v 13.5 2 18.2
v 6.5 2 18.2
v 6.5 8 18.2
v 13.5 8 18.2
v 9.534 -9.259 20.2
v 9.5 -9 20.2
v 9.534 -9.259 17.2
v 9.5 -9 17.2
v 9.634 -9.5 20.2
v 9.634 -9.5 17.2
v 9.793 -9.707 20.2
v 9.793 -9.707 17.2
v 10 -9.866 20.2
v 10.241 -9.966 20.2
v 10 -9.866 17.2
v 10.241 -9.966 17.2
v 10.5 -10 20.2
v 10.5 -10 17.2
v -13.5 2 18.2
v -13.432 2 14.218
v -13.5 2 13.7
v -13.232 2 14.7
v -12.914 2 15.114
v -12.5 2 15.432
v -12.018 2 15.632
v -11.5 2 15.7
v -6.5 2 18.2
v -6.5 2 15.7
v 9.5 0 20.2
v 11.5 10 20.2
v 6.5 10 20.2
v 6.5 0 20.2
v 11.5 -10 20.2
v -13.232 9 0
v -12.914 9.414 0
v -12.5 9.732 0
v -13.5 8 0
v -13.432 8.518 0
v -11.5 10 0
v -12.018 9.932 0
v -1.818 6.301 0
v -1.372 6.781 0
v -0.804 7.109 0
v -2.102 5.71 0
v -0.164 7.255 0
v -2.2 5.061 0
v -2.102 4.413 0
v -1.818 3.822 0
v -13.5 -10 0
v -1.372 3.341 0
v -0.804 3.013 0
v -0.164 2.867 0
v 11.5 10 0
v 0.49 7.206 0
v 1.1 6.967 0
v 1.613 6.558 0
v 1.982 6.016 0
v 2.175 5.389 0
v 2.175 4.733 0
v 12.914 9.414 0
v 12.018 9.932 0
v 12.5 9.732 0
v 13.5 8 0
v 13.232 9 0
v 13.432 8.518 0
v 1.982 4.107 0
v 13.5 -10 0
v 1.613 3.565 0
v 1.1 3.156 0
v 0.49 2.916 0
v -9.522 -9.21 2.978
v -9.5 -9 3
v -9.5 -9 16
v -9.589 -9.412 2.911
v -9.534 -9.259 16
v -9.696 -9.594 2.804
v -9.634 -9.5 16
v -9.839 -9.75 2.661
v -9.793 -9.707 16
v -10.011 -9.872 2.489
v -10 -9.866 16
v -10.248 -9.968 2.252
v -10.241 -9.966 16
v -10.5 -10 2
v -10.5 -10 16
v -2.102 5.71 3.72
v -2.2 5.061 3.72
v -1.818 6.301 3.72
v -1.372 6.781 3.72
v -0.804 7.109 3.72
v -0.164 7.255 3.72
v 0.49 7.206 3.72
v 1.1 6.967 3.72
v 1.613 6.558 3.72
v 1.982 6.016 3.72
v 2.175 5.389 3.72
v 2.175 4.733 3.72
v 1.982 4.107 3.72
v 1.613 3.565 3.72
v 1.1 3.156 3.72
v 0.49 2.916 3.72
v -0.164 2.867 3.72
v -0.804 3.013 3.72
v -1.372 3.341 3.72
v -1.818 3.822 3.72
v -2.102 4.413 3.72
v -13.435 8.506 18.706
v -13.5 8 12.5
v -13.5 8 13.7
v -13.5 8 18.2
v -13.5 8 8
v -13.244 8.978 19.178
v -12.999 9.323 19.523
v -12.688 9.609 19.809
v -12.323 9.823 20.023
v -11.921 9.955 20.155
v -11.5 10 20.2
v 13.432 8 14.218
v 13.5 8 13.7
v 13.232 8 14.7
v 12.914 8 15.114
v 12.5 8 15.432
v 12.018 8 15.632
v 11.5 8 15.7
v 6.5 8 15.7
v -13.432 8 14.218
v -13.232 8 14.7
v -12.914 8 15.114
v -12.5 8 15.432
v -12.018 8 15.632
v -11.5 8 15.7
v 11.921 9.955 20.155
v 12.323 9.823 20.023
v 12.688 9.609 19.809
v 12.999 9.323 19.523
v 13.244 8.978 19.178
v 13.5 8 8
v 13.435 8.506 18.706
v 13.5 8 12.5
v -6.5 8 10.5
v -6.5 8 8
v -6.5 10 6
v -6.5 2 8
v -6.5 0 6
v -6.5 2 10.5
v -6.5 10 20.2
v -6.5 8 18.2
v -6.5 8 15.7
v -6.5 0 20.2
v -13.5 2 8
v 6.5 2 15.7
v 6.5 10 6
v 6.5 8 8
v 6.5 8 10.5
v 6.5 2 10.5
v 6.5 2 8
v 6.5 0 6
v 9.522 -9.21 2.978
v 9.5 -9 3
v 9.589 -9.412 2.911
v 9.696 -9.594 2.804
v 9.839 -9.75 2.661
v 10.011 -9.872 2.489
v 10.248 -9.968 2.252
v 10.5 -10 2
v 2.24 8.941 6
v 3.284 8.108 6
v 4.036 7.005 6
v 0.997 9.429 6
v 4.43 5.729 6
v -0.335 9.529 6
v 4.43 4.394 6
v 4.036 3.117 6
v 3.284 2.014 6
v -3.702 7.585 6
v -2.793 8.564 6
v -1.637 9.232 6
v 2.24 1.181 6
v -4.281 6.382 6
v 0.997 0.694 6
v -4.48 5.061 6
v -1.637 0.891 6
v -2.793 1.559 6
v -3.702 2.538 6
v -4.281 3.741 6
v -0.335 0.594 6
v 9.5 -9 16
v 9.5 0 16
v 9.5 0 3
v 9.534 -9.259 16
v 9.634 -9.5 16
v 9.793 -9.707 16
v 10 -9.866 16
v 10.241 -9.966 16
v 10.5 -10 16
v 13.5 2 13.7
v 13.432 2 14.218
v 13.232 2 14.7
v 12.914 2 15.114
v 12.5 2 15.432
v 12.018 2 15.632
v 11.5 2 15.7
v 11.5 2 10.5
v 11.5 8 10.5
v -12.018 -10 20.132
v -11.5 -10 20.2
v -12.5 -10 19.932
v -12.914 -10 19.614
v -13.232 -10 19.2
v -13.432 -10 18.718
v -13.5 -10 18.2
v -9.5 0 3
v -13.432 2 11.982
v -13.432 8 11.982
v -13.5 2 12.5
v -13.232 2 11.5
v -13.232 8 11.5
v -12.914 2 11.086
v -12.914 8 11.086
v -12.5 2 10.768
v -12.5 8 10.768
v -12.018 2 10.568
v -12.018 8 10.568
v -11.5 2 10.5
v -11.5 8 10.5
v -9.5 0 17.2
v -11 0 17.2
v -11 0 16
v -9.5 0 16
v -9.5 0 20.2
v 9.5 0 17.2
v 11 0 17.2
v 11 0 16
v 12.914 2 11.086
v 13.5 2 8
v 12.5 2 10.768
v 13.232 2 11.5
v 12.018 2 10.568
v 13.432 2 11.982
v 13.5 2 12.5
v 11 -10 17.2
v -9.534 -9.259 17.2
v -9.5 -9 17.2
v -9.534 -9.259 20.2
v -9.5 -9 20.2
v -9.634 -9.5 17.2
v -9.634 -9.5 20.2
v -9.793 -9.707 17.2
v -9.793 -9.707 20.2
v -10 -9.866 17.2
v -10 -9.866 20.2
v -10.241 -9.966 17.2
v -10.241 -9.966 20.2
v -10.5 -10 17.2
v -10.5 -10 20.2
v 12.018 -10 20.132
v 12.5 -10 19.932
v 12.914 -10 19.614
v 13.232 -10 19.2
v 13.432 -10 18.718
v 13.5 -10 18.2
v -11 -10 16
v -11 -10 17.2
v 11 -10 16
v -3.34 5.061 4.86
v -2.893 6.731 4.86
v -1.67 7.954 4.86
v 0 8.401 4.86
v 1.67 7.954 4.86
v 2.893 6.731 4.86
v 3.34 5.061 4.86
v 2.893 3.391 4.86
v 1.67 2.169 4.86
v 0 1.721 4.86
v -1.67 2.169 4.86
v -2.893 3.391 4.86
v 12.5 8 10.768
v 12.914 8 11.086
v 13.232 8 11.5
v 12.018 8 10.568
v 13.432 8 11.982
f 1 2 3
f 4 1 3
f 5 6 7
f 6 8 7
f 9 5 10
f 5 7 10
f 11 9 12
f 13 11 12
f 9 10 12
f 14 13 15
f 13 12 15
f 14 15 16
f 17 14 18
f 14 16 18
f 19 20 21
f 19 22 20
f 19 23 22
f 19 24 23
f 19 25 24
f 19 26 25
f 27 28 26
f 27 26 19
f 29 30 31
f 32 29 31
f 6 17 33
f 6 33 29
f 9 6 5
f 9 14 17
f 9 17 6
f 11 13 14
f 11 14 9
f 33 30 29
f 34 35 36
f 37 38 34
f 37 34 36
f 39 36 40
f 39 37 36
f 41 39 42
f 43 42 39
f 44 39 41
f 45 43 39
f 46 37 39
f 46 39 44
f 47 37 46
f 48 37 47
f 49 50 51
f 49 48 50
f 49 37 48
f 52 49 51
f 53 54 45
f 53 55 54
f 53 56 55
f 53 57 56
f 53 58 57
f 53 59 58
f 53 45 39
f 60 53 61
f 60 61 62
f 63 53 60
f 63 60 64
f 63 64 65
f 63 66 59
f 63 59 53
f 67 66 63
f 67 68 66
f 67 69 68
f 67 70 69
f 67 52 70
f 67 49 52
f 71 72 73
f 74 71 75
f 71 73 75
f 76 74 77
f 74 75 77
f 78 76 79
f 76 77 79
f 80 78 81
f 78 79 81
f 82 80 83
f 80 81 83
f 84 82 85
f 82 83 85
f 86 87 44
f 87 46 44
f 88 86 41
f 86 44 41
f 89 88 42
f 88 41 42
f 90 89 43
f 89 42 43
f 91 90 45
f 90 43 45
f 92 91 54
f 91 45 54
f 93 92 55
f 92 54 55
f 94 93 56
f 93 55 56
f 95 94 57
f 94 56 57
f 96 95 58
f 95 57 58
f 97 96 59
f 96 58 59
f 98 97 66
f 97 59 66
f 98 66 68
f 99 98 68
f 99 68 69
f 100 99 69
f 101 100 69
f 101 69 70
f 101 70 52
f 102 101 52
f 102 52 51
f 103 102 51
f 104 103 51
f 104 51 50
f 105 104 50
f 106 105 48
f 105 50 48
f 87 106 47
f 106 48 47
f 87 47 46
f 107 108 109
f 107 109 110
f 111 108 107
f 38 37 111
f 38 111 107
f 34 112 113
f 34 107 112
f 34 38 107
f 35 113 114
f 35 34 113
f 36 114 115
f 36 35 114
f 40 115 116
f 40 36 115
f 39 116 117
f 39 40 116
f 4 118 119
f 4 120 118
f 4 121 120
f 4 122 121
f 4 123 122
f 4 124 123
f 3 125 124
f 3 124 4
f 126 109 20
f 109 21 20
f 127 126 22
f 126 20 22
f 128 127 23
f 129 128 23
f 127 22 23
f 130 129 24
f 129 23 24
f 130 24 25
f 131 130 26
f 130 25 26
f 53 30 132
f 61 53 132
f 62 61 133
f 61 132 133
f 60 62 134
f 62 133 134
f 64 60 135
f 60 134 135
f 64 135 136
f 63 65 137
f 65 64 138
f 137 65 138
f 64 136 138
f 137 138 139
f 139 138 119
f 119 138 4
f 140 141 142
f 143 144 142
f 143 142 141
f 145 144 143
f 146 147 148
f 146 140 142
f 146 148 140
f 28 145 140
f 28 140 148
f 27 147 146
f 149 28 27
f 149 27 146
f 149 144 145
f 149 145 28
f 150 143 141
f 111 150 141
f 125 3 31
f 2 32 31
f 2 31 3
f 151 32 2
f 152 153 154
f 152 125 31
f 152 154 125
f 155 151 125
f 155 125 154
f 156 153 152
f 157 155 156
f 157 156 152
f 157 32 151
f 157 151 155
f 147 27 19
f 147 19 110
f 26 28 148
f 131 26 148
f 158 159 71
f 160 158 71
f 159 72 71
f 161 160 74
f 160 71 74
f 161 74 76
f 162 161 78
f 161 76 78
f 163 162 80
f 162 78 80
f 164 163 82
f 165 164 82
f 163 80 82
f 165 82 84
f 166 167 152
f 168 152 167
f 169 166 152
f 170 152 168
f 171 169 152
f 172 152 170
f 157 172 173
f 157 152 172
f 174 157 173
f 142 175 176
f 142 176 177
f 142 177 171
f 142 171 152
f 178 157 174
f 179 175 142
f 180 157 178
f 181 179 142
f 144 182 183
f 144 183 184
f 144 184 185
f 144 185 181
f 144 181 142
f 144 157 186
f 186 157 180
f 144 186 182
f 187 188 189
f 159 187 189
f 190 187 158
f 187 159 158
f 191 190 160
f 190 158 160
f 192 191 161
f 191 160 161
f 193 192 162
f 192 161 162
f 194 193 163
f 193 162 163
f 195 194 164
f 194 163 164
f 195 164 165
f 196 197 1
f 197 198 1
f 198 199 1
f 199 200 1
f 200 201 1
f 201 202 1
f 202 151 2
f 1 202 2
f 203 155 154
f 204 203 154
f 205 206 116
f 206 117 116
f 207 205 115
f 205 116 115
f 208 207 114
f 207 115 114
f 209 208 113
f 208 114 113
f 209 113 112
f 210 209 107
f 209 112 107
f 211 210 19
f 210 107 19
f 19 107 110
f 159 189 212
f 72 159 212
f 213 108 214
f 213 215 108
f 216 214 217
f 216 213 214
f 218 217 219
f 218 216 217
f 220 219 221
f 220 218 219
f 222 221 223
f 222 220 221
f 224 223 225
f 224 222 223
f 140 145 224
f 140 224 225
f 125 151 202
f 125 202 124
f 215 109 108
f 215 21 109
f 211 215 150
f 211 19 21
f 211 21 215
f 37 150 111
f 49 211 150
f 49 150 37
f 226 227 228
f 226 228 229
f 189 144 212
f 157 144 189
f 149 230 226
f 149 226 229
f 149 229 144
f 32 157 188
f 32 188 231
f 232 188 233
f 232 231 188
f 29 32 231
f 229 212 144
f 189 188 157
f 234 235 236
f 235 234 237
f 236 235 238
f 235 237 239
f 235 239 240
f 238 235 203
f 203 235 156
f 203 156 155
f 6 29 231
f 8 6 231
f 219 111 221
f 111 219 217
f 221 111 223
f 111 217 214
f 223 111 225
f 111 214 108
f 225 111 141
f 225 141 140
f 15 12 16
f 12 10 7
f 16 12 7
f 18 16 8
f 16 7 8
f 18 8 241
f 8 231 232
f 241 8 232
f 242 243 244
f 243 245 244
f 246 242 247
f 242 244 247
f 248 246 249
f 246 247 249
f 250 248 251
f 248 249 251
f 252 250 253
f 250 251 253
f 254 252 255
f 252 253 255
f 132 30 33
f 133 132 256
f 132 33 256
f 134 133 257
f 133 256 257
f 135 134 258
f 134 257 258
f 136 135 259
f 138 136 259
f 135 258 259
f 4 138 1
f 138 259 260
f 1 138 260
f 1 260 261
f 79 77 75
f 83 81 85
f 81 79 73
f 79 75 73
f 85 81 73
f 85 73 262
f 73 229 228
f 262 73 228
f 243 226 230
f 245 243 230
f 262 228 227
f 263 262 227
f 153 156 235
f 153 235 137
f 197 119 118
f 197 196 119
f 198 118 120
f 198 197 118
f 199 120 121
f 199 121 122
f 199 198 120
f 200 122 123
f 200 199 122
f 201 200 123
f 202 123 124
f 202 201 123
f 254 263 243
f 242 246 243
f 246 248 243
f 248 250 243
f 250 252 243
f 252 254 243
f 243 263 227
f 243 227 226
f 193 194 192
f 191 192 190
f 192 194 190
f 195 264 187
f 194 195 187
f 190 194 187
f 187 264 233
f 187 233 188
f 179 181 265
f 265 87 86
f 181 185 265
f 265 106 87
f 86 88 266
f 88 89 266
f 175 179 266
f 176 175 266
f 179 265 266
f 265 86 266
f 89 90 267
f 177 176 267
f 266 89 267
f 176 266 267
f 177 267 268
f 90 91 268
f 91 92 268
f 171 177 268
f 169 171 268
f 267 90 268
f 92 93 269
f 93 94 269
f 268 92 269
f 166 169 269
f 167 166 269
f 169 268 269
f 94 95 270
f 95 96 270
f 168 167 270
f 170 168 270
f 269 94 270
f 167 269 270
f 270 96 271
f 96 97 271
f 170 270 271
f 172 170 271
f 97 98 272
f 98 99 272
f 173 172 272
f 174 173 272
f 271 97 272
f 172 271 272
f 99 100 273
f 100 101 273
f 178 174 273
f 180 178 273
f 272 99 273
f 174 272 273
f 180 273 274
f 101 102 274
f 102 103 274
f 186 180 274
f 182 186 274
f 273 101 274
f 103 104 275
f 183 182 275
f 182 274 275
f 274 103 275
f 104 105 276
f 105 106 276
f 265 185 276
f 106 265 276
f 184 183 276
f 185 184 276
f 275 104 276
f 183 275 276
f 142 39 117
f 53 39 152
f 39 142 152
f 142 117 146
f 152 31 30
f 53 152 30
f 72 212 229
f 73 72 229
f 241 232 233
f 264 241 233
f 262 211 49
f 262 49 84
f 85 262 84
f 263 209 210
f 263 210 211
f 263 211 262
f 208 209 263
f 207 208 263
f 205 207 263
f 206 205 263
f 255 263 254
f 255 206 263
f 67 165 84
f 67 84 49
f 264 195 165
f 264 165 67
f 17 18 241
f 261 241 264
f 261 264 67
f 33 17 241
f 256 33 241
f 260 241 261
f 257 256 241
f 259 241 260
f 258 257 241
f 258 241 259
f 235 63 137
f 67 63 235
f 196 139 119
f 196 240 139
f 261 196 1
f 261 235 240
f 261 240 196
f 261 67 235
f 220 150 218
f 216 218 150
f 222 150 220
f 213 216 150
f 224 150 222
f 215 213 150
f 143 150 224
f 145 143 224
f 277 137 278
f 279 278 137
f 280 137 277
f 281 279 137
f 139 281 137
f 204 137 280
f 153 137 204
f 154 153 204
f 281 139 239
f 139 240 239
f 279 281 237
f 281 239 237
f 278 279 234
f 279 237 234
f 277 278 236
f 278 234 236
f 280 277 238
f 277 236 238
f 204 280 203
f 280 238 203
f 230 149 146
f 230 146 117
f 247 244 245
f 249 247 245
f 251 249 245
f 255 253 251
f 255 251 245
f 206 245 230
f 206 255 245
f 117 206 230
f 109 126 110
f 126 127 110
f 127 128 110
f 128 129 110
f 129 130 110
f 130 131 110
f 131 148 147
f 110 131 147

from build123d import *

# Parameters (mm, degrees)
F1_DEPTH       = 10
F3_DEPTH       = 10
F5_D           = 4.4
F5_CSINK_D     = 8.96
F5_CSINK_ANGLE = 90
F6_R           = 1
F7_R           = 2
F8_W           = 6
F8_H           = 2.5
F9_DEPTH       = 7.001
F9_DEPTH_BACK  = 20.001
F10_R          = 2


with BuildPart() as f1:
    # F0 (on Front) → F1 (new body)
    with BuildSketch(Plane.XZ):
        Polygon((-13.5, 20.2), (-13.5, 0), (13.5, 0), (13.5, 20.2), (9.5, 20.2), (9.5, 17.2), (11, 17.2), (11, 16), (9.5, 16), (9.5, 3), (-9.5, 3), (-9.5, 16), (-11, 16), (-11, 17.2), (-9.5, 17.2), (-9.5, 20.2), align=None)
    extrude(amount=F1_DEPTH)

    # F2 (on Front) → F3 (join)
    with BuildSketch(Plane.XZ):
        Polygon((-13.5, 0), (13.5, 0), (13.5, 20.2), (6.5, 20.2), (6.5, 6), (-6.5, 6), (-6.5, 20.2), (-13.5, 20.2), align=None)
    extrude(amount=-F3_DEPTH)

    # F5 (through all)
    with Locations(Plane.XY.offset(6)):
        with Locations((0, 5.0612445921)):
            CounterSinkHole(F5_D / 2, F5_CSINK_D / 2, counter_sink_angle=F5_CSINK_ANGLE)

    # F6
    f6_edges = [f1.edges().sort_by_distance(p)[0] for p in [
        (0, -10, 3),
        (-9.5, -10, 9.5),
        (-9.5, -10, 18.7),
        (9.5, -10, 18.7),
        (9.5, -10, 9.5),
    ]]
    fillet(f6_edges, radius=F6_R)

    # F7
    f7_edges = [f1.edges().sort_by_distance(p)[0] for p in [
        (-13.5, 0, 20.2),
        (-13.5, 10, 10.1),
        (13.5, 10, 10.1),
        (13.5, 0, 20.2),
    ]]
    fillet(f7_edges, radius=F7_R)

    # F8 (on face) → F9 (cut, two sides)
    with BuildSketch(Plane.YZ.offset(-6.5)) as f9_sk:
        with Locations((5, 16.95)):
            Rectangle(F8_W, F8_H)
        with Locations((5, 9.25)):
            Rectangle(F8_W, F8_H)
    extrude(amount=-F9_DEPTH, mode=Mode.SUBTRACT)
    extrude(f9_sk.sketch, amount=F9_DEPTH_BACK, mode=Mode.SUBTRACT)

    # F10
    f10_edges = [f1.edges().sort_by_distance(p)[0] for p in [
        (-13.5, 5, 15.7),
        (-13.5, 5, 10.5),
        (13.5, 5, 15.7),
        (13.5, 5, 10.5),
    ]]
    fillet(f10_edges, radius=F10_R)


solid = f1.part
